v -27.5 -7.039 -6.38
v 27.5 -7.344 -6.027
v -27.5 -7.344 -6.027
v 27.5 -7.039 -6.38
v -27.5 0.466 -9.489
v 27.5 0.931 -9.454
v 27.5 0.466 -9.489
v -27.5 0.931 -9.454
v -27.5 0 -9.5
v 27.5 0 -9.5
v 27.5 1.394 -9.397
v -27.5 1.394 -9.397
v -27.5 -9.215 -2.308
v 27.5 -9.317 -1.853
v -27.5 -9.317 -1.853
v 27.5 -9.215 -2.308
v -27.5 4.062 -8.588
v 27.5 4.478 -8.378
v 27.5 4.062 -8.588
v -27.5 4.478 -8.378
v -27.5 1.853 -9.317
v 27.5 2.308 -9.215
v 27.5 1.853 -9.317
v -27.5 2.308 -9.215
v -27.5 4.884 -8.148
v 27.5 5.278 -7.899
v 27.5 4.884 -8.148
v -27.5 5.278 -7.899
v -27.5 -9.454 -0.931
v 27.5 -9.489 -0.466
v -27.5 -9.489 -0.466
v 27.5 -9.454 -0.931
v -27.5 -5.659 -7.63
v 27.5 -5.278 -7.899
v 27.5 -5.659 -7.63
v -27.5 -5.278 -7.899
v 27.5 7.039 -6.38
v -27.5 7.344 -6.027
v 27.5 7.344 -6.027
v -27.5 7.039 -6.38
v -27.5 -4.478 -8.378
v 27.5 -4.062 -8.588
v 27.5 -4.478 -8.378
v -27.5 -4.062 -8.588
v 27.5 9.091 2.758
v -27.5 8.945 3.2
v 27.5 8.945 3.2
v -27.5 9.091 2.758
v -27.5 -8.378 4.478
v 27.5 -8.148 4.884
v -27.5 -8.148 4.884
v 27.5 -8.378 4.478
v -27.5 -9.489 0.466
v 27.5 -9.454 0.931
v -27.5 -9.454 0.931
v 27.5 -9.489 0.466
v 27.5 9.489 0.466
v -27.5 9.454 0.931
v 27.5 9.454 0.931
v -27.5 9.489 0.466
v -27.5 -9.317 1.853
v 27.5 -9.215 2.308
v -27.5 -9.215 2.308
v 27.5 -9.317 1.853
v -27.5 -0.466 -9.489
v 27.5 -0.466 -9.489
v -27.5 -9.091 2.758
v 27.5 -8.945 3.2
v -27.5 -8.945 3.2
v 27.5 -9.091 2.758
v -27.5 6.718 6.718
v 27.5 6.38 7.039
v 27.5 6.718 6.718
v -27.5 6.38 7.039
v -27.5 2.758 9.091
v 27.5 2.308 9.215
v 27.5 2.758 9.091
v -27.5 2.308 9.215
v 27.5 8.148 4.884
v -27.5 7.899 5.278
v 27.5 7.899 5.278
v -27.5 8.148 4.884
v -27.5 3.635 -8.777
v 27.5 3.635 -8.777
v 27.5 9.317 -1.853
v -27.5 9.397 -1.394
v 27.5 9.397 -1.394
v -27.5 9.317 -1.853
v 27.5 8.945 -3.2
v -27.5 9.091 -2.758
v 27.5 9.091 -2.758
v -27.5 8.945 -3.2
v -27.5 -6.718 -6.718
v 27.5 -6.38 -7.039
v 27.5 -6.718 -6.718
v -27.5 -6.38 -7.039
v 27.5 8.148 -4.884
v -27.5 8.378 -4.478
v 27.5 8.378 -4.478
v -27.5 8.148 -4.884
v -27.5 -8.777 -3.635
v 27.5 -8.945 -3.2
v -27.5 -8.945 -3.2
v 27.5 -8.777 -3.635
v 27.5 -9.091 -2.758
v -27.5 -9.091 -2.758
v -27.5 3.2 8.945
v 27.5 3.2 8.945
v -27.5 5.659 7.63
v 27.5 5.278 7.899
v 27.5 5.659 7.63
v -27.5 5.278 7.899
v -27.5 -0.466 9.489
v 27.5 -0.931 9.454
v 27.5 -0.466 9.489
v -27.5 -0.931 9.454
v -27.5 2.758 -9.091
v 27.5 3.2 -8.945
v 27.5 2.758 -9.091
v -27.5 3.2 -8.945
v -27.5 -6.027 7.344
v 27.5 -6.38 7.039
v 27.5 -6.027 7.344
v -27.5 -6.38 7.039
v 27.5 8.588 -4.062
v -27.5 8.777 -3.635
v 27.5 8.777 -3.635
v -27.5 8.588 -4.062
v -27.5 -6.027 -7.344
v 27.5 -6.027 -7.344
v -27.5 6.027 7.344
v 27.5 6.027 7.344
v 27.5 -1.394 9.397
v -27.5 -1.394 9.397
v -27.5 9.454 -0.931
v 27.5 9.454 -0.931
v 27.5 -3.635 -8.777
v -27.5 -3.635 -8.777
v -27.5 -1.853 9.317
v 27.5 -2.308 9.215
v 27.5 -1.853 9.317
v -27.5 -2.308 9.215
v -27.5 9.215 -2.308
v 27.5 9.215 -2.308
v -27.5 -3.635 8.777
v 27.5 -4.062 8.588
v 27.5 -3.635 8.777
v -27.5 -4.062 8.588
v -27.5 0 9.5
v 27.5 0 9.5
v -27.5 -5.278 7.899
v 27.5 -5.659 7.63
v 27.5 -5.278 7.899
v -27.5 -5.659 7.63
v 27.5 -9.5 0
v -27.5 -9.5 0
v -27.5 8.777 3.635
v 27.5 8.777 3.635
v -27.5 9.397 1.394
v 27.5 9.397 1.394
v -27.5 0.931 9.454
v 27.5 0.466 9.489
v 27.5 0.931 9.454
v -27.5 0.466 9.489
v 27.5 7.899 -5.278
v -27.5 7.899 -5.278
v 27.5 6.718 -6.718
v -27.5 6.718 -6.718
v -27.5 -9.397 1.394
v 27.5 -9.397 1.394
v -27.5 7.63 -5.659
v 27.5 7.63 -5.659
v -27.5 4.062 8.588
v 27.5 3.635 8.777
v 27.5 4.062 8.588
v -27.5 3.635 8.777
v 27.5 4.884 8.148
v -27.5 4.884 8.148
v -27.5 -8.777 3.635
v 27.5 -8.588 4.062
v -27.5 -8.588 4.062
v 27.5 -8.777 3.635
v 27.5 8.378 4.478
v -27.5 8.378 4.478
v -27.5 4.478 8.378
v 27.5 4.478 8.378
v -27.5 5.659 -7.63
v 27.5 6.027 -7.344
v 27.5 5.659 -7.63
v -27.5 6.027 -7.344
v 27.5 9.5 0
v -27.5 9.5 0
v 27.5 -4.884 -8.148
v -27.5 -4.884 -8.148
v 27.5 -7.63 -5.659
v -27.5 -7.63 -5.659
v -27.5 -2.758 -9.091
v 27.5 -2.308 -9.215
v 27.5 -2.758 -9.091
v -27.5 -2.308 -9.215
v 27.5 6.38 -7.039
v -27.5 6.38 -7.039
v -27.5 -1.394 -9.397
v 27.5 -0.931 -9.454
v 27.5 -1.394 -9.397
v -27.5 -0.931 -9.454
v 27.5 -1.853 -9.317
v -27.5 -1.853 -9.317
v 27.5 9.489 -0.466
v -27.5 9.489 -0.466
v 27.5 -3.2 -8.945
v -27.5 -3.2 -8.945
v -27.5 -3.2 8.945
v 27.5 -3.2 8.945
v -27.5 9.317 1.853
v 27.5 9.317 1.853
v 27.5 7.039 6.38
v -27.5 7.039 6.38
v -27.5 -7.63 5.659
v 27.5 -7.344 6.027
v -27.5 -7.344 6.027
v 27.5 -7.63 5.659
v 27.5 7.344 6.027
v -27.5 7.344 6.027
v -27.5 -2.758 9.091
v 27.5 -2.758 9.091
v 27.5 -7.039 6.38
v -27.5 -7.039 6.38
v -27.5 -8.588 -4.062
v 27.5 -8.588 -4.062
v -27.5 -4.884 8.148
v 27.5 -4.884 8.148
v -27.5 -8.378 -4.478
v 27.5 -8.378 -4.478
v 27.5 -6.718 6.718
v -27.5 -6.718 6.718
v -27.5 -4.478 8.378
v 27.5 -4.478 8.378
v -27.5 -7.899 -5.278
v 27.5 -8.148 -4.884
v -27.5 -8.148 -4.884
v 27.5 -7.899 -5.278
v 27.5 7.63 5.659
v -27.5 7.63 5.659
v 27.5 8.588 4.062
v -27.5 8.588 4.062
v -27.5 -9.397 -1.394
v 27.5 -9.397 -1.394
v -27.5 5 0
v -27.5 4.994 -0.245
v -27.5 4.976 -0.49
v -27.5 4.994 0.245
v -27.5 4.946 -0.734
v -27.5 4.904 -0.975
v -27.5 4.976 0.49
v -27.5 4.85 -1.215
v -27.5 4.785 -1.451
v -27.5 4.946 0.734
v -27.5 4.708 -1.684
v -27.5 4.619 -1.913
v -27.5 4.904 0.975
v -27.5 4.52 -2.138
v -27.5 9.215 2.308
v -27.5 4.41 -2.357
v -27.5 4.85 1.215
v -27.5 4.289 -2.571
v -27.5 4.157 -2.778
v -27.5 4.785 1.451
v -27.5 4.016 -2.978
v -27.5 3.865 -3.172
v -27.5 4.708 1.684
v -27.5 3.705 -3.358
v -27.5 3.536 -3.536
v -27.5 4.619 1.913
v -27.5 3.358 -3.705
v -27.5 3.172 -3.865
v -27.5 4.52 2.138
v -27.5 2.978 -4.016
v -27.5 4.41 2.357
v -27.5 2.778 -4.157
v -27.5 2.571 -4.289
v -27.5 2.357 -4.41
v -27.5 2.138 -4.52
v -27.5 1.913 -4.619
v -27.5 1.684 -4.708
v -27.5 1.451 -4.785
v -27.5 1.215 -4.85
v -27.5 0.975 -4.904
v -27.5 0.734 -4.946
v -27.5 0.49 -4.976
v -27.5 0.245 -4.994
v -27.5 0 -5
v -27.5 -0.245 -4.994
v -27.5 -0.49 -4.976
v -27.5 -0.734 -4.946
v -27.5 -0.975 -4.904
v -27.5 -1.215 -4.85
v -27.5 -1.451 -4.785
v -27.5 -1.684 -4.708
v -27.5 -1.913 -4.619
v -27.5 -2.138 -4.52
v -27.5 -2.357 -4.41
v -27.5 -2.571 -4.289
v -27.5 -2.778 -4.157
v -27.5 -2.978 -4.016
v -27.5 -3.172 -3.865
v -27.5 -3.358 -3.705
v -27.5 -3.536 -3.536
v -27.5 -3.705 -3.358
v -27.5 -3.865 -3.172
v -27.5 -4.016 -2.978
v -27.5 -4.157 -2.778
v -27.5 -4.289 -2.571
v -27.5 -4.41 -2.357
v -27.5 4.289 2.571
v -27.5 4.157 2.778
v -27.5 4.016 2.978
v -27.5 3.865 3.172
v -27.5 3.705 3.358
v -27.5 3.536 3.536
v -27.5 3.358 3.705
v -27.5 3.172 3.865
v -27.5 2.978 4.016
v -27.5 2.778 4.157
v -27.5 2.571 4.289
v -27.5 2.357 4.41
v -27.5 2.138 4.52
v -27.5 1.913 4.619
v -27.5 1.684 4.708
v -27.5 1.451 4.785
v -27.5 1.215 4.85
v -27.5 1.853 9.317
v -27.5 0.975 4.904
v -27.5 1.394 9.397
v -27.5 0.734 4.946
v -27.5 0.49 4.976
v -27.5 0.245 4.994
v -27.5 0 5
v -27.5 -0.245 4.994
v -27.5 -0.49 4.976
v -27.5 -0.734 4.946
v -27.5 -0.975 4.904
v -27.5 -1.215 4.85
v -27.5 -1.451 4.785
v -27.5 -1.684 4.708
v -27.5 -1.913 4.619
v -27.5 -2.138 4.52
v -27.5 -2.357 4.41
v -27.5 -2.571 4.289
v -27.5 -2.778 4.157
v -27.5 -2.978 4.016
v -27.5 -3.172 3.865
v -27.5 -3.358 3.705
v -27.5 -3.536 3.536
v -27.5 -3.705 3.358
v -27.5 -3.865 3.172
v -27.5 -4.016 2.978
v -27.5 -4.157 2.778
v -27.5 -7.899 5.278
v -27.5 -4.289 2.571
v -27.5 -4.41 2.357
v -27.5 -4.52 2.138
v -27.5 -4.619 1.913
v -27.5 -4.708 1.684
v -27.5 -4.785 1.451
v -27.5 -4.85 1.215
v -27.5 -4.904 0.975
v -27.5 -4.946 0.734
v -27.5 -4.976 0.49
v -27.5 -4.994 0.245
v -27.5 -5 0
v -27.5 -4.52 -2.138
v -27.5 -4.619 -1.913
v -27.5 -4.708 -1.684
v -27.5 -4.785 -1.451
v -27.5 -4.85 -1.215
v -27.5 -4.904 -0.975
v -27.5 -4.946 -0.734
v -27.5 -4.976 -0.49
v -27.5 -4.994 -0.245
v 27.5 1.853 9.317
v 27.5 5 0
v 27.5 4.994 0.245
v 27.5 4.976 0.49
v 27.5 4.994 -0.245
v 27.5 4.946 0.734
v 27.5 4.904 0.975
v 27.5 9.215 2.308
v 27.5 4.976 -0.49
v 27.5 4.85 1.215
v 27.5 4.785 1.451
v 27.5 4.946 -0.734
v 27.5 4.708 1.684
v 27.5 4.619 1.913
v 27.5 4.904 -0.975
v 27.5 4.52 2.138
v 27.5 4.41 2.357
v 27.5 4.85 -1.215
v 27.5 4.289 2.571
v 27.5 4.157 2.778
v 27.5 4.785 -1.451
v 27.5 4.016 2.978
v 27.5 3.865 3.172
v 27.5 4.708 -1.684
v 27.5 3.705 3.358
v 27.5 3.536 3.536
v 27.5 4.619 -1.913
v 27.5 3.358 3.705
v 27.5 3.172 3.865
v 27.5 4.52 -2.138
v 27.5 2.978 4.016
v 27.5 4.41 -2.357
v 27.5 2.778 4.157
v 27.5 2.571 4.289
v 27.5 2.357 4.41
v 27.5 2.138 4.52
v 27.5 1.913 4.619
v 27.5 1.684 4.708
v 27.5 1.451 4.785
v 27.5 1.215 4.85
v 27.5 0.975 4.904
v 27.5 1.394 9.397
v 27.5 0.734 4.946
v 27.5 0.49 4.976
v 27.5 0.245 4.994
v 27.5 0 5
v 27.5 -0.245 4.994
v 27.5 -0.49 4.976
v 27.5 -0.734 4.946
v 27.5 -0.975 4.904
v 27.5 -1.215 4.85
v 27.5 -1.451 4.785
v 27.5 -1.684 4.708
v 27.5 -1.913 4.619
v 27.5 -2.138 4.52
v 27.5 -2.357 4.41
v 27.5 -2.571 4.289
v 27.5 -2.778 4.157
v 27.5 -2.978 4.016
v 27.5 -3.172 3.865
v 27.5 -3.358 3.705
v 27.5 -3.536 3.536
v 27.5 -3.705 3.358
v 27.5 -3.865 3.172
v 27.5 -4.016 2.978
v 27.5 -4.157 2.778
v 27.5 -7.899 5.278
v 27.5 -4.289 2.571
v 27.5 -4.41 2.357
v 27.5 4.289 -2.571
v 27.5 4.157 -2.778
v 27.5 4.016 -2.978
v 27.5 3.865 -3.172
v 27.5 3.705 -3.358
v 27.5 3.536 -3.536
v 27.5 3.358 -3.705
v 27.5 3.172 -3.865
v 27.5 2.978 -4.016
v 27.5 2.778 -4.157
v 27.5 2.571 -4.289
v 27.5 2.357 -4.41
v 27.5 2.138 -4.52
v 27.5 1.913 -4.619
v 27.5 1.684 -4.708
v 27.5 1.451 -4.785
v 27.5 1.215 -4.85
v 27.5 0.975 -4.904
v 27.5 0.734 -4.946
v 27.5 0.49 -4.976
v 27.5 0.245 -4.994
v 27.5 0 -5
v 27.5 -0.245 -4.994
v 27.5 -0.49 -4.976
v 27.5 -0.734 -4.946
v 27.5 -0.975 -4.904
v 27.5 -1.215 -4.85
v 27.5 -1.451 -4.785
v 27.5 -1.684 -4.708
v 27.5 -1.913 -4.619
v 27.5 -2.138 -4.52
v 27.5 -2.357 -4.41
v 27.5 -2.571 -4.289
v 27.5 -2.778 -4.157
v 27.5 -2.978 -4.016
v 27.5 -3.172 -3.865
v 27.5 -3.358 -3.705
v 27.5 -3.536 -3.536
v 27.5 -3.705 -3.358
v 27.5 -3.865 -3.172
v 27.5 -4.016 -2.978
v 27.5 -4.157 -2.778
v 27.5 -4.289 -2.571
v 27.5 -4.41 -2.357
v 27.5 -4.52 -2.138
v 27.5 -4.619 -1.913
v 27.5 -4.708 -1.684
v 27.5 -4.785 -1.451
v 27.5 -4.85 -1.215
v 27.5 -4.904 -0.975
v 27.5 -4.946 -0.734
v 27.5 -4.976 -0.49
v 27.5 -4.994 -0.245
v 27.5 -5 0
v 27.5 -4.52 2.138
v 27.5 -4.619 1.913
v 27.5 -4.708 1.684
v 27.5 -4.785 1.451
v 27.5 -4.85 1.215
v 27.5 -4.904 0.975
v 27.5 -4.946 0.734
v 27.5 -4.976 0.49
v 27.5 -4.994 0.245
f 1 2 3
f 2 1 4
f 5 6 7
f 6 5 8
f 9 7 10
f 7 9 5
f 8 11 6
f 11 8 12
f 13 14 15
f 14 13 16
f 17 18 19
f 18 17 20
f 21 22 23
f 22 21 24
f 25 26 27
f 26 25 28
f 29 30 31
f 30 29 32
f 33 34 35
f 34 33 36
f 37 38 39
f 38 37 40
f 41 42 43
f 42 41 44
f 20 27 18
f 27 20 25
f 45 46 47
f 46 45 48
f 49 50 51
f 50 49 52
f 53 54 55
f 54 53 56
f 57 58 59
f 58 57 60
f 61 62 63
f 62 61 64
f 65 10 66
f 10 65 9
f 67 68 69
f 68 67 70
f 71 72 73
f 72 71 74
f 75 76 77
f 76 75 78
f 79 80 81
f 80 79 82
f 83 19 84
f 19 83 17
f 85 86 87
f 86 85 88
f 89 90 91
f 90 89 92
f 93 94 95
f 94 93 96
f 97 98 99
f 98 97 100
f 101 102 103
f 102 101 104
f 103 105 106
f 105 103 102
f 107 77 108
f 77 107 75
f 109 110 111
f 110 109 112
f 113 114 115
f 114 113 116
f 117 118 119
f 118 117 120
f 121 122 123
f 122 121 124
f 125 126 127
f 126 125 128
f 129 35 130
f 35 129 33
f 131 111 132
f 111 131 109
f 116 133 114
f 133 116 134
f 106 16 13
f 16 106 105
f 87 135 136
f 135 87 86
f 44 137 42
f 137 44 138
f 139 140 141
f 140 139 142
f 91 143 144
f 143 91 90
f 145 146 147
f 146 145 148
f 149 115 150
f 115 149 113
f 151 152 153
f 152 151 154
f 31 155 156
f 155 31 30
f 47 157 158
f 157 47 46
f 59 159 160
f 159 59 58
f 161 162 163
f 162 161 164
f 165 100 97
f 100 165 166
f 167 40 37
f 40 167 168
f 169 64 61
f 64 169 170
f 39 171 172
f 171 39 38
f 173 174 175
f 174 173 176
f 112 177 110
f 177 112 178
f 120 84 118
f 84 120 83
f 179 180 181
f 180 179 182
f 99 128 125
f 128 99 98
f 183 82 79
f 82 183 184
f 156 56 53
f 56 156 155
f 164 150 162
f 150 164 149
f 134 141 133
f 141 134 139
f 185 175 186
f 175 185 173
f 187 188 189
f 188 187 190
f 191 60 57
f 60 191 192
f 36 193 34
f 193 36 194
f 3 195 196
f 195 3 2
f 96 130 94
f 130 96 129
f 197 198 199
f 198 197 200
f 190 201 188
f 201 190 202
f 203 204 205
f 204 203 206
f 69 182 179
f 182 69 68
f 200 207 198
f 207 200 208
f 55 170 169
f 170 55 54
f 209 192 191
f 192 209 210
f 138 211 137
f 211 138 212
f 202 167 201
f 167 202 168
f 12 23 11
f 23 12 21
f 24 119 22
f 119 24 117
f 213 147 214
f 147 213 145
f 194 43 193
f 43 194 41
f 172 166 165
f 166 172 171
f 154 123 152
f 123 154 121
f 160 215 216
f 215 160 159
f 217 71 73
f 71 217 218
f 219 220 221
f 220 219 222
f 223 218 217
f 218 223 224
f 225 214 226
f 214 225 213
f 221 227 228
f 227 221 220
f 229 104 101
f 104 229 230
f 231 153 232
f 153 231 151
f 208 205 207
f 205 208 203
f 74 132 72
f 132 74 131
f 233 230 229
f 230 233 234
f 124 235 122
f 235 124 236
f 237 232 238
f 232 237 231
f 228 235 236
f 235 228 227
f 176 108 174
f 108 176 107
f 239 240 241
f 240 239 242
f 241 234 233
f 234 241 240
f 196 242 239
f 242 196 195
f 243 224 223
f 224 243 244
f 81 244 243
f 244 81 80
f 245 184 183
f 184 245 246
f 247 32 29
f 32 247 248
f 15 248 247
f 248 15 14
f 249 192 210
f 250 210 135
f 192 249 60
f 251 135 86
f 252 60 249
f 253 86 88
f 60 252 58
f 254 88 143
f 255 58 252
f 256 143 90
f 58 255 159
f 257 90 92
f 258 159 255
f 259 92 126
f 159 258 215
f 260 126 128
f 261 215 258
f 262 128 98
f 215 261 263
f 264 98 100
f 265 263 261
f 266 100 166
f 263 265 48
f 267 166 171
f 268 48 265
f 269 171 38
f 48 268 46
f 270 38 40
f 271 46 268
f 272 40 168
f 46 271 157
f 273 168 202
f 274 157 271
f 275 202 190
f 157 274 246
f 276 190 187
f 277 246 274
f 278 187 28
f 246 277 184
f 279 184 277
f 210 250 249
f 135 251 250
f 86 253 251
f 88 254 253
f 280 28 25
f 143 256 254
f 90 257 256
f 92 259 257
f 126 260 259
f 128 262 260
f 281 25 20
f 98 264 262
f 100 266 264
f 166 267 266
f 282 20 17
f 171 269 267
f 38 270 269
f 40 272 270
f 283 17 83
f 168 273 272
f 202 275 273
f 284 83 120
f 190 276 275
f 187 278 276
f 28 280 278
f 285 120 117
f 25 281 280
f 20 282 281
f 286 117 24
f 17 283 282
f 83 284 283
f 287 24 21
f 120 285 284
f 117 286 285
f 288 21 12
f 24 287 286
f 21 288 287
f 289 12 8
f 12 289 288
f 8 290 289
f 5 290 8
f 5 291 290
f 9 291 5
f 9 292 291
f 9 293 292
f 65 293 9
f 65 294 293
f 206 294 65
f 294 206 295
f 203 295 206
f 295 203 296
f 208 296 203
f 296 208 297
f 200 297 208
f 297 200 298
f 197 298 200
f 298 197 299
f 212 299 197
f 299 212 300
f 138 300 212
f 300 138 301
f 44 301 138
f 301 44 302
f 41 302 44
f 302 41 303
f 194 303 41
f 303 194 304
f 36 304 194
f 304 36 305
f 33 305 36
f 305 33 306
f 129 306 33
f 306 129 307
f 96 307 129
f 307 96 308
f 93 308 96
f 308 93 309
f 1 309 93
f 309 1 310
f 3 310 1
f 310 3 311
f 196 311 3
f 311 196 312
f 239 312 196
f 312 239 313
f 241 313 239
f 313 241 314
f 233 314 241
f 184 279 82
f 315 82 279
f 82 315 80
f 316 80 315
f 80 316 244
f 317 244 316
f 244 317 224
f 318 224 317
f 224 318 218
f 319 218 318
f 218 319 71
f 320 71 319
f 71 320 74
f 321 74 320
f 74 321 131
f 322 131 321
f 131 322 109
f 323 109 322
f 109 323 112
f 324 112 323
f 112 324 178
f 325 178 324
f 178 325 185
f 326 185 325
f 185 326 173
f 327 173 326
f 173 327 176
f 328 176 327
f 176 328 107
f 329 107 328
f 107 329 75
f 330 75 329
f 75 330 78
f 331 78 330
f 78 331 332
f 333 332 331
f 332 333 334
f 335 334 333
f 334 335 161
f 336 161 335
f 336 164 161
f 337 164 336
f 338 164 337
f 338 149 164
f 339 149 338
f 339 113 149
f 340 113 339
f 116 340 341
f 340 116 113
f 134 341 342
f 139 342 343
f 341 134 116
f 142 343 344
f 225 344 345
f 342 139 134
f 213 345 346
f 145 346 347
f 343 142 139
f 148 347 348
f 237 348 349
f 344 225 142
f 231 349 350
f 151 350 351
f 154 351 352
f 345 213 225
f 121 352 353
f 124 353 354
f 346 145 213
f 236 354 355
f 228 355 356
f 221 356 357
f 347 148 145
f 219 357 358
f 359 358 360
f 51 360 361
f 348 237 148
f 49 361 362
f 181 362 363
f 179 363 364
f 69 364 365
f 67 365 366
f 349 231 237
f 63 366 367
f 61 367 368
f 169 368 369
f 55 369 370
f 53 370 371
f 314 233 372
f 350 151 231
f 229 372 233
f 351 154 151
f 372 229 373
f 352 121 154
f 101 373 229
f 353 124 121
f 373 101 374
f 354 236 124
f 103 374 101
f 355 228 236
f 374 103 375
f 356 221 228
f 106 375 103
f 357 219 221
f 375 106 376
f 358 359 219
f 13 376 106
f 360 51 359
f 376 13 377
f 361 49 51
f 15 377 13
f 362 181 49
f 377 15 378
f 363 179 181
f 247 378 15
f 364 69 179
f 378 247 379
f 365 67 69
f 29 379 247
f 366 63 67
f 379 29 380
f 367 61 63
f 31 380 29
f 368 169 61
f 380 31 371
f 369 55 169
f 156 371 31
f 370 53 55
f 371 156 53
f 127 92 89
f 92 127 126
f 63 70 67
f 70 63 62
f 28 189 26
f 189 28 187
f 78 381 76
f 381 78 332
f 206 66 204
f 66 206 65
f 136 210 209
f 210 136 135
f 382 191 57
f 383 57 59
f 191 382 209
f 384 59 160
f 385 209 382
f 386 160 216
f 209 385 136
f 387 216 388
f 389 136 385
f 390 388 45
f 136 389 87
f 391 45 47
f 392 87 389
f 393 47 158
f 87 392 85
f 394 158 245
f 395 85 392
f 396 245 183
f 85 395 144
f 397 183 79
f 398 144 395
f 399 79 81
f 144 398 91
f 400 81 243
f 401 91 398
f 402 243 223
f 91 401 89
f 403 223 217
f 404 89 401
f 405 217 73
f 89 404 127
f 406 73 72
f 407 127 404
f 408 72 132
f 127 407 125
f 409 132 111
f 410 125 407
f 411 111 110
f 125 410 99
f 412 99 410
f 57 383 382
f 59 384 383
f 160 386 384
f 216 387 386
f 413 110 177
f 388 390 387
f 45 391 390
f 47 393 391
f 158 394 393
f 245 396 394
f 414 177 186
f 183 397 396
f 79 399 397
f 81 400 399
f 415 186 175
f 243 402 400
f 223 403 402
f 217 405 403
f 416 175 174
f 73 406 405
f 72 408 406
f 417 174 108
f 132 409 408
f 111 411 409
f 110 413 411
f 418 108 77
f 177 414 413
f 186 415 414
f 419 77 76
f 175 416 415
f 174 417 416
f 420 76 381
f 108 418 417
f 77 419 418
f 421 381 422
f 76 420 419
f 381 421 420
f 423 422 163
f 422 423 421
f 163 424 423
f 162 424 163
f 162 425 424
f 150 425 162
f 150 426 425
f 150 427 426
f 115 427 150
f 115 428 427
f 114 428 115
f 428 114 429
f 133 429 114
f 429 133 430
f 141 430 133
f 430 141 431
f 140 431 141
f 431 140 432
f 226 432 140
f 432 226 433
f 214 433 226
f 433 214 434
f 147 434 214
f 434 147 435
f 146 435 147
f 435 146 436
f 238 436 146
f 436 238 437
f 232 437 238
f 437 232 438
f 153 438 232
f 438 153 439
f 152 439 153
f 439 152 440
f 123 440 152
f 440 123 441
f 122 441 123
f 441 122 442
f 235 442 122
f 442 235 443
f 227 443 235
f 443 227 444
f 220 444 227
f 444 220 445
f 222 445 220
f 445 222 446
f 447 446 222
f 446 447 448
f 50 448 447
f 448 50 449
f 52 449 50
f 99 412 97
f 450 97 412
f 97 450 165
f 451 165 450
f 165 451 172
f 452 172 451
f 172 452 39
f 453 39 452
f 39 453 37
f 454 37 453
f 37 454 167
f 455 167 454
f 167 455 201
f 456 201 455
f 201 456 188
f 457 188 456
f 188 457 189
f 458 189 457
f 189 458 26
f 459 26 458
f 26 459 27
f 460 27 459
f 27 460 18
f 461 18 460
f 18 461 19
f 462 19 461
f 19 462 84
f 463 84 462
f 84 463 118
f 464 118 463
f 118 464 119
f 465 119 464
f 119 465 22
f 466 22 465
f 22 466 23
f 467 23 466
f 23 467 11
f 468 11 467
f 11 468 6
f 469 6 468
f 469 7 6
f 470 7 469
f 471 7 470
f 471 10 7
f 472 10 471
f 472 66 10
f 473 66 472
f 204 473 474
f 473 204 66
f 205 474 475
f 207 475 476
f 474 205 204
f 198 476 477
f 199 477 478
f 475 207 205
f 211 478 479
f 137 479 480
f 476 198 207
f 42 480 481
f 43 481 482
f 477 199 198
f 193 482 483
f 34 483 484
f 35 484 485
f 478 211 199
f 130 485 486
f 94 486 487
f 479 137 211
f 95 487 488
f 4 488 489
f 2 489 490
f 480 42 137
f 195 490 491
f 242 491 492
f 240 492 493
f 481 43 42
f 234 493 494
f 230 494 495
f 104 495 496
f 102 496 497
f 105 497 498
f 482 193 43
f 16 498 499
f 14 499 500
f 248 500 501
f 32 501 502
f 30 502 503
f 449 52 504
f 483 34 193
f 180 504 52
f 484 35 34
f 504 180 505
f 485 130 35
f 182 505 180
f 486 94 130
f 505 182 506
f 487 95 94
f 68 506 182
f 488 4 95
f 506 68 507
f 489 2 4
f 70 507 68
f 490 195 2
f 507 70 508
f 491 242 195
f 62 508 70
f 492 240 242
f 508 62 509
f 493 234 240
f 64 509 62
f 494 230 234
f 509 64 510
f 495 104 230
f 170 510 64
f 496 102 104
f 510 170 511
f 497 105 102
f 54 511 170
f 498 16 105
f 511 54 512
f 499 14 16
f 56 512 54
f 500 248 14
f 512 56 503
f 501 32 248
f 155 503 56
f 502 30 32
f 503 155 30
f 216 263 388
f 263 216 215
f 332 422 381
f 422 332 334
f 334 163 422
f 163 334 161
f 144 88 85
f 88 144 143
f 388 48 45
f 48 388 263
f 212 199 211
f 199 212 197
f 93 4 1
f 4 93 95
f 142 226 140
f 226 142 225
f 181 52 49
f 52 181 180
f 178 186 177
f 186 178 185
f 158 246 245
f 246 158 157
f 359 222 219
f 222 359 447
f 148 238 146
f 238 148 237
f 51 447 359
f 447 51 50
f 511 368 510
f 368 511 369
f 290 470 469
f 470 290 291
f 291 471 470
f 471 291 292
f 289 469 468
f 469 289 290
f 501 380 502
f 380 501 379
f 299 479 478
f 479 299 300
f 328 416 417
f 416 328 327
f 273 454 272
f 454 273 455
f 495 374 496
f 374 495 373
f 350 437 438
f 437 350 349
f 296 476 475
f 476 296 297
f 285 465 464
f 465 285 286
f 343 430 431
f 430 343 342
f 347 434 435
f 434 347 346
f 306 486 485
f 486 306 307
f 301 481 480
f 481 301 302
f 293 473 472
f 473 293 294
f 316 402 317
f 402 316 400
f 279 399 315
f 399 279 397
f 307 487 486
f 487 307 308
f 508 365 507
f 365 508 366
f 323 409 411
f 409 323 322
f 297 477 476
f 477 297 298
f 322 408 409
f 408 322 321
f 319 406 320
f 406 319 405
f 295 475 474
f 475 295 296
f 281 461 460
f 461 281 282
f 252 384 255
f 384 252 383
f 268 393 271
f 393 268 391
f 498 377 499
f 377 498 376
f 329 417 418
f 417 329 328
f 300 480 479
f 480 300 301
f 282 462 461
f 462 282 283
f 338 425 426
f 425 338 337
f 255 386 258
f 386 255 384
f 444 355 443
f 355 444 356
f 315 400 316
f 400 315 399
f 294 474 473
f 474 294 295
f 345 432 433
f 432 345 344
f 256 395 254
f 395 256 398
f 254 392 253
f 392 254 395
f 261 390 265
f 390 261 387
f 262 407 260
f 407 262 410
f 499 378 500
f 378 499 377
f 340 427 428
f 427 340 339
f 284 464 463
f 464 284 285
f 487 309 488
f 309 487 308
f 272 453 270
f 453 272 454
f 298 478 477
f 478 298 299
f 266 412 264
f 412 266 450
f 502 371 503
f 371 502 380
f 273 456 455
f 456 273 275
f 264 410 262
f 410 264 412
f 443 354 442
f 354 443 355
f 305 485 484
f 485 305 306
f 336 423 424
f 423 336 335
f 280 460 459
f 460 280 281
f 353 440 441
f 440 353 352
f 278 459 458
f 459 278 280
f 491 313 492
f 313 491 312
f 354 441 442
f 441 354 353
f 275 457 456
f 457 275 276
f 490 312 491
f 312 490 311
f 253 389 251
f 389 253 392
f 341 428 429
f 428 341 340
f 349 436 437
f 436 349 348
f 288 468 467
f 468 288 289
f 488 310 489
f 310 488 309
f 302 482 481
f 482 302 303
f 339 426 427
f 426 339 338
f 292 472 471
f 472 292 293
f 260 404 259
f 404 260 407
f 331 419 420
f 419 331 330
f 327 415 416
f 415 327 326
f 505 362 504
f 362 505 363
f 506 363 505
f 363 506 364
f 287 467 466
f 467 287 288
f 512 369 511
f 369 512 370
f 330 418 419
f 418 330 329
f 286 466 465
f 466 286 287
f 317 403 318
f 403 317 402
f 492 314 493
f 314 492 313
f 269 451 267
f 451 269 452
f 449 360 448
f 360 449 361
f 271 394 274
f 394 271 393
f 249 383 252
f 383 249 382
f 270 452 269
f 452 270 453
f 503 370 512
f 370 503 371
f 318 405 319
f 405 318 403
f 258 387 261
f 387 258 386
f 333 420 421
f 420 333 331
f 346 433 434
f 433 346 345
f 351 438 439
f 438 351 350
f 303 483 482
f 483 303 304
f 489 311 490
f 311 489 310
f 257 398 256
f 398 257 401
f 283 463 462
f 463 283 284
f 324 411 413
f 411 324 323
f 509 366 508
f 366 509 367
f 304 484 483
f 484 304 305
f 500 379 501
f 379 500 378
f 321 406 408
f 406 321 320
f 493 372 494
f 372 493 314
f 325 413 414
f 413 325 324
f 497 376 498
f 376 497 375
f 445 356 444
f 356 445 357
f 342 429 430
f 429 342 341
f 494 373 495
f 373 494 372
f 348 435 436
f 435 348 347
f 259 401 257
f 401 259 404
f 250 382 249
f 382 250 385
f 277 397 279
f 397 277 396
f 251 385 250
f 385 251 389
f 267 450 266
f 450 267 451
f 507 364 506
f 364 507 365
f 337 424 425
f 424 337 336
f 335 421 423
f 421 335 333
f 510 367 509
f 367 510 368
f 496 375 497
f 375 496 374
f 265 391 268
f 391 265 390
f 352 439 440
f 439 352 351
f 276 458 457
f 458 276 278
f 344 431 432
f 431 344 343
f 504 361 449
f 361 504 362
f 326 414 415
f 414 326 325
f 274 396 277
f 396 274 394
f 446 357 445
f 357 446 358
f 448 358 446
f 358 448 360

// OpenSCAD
$fn = 128;

bore_d = 10.0;
od_d   = 19.0;
len    = 55.0;

eps = 0.02;

// Orient the bearing axis along X so standard orthographic views show:
// Front/Back = side profile (length visible), Left/Right = annular end view.
rotate([0, 90, 0])
difference() {
    cylinder(d = od_d, h = len, center = true);
    cylinder(d = bore_d, h = len + 2*eps, center = true);
}
